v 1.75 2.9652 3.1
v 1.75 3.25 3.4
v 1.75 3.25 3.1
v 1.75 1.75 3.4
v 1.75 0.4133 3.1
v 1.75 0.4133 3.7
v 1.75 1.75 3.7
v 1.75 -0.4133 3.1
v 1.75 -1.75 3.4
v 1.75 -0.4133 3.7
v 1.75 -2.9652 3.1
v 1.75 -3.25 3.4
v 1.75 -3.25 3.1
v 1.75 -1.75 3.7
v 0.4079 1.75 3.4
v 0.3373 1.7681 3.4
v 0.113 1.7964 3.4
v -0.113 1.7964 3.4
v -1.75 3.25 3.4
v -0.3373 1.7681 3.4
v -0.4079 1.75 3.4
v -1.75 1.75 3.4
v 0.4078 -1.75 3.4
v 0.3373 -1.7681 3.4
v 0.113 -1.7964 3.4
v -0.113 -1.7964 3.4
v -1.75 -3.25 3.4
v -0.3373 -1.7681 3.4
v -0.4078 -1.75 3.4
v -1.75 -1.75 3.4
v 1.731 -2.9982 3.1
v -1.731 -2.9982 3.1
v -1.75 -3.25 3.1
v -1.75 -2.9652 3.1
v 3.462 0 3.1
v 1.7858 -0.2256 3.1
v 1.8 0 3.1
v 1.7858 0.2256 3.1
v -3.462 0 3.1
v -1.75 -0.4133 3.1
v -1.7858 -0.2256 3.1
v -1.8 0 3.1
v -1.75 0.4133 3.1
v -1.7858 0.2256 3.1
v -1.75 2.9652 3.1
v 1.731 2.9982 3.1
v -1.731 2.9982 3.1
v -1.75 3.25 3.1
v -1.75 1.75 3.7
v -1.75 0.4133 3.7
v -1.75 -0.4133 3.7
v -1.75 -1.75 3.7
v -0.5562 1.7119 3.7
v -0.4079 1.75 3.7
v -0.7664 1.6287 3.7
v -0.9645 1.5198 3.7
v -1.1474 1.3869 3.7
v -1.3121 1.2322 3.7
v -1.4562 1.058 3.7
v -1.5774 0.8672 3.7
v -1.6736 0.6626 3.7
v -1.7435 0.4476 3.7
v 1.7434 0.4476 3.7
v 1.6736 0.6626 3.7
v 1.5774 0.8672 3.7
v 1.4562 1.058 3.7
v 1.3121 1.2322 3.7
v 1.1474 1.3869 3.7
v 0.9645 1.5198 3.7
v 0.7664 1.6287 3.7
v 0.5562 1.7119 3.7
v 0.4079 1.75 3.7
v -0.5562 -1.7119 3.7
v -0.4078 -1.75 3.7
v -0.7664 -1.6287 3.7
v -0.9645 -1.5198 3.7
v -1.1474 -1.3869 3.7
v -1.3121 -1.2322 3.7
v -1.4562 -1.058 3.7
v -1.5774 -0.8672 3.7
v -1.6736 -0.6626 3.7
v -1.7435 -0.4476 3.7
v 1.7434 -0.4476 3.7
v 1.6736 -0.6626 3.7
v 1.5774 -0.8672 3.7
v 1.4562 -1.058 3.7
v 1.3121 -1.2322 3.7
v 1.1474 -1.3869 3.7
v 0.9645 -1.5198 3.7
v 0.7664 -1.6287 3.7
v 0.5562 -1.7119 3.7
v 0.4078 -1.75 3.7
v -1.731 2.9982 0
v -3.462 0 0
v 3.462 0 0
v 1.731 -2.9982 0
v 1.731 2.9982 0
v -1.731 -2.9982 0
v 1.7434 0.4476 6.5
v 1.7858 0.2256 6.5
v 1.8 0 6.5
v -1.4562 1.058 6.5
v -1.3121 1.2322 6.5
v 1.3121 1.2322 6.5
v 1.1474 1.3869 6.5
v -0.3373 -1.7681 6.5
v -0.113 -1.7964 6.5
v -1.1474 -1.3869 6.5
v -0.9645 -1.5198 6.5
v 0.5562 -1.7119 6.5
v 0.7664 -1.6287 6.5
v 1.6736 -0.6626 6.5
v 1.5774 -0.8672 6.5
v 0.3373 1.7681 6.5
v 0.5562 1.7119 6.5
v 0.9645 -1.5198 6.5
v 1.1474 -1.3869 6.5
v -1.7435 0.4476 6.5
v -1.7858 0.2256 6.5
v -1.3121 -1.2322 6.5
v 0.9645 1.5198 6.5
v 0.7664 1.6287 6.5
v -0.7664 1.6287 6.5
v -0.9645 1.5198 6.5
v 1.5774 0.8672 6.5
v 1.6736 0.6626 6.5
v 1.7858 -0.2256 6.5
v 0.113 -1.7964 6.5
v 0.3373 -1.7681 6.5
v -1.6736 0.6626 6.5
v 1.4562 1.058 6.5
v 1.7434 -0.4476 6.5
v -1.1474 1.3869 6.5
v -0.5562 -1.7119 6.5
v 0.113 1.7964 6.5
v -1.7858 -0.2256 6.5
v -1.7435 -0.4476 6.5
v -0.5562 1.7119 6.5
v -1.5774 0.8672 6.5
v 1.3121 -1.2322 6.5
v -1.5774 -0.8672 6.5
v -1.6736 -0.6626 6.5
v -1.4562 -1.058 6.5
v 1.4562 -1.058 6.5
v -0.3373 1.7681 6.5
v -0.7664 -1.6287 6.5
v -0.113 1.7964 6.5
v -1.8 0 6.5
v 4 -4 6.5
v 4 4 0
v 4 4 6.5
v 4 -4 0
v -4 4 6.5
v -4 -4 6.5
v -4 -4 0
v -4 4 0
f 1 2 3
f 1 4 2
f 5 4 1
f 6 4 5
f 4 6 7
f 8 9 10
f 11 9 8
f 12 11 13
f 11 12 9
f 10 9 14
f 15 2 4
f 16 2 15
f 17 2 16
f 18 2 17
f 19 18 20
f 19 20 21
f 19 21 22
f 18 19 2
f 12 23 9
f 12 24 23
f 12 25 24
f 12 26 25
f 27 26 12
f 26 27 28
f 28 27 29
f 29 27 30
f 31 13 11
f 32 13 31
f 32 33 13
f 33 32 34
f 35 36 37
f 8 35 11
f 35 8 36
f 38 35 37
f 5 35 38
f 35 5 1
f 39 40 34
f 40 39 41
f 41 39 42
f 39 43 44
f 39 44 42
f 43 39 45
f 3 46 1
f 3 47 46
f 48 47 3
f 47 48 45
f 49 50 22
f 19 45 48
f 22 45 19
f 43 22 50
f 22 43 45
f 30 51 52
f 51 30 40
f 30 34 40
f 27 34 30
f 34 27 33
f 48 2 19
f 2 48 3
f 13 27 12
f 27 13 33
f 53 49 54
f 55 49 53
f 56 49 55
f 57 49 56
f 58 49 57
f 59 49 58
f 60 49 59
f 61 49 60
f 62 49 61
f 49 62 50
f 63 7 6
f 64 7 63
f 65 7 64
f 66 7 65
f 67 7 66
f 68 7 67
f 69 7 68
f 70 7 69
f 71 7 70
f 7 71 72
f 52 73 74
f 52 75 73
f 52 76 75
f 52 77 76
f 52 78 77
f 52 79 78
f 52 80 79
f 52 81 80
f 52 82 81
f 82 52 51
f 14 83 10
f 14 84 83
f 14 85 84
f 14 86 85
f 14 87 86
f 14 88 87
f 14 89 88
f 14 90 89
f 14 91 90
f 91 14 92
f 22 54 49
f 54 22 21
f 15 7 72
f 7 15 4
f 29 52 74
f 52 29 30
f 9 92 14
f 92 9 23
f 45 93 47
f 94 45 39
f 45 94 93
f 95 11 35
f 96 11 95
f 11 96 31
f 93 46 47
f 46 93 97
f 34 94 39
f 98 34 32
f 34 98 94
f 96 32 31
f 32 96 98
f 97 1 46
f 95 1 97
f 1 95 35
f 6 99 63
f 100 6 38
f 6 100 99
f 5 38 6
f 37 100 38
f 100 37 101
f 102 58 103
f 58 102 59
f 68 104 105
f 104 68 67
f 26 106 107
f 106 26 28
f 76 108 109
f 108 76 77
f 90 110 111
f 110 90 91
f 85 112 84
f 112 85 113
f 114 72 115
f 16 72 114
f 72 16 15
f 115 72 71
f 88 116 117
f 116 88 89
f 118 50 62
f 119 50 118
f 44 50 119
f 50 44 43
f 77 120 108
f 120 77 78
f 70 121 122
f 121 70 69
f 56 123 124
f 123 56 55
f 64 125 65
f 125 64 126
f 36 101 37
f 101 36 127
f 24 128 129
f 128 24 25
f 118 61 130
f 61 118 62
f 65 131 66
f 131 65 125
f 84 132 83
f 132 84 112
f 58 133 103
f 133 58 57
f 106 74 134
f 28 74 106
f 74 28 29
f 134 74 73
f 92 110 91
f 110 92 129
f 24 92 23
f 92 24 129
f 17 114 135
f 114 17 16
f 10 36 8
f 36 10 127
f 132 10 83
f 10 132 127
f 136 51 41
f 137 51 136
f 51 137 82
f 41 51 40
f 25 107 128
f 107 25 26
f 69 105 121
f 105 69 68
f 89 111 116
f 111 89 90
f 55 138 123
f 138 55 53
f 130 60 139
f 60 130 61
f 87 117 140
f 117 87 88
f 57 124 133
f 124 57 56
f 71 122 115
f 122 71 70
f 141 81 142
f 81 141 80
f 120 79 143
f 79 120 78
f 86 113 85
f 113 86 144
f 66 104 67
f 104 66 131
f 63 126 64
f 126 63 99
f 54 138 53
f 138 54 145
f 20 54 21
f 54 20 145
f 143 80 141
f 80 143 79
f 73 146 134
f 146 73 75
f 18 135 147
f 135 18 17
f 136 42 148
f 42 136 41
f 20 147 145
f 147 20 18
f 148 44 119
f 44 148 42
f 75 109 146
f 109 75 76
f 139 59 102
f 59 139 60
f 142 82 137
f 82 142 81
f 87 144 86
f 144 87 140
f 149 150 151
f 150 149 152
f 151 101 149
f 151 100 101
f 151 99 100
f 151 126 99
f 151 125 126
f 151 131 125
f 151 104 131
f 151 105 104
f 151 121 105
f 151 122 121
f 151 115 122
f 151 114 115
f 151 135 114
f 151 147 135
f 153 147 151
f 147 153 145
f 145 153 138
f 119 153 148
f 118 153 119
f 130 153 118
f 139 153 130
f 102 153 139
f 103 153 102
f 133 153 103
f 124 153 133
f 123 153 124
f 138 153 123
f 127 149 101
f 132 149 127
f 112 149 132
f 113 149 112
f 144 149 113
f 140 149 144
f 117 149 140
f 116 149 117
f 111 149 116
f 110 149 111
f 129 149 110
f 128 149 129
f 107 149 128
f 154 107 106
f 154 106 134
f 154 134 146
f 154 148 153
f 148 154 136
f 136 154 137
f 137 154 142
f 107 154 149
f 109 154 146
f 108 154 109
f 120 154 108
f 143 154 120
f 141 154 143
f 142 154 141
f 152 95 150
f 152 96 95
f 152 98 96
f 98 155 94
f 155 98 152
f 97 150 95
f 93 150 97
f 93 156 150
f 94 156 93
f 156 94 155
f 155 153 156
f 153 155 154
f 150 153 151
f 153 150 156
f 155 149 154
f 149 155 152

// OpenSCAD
$fn = 50;

difference() {
	union() {
		translate(v = [-22.5, 7.5, 9.5]) {
			rotate(a = [0, 0, 0]) {
				difference() {
					union() {
						translate(v = [18.5, -11.5, -9.5]) {
							cube(size = [8, 8, 6.5]);
						}
					}
					union() {
						translate(v = [22.5, -7.5, -9.6]) {
							rotate(a = [0, 0, 0]) {
								difference() {
									union() {
										translate(v = [-1.75, -3.25, -0.3]) {
											cube(size = [3.5, 6.5, 0.3]);
										}
										translate(v = [-1.75, -1.75, -0.6]) {
											cube(size = [3.5, 3.5, 0.3]);
										}
										translate(v = [-1.75, -3.25, 3.2]) {
											cube(size = [3.5, 6.5, 0.3]);
										}
										translate(v = [-1.75, -1.75, 3.5]) {
											cube(size = [3.5, 3.5, 0.3]);
										}
										linear_extrude(height = 3.2) {
											polygon(points = [[3.4619999999999997, 0.0], [1.7310000000000003, 2.9981799479017264], [-1.7309999999999992, 2.9981799479017264], [-3.4619999999999997, 4.2397272186481365e-16], [-1.7310000000000014, -2.998179947901726], [1.7309999999999977, -2.9981799479017277]]);
										}
										translate(v = [-1.75, -3.25, -0.3]) {
											cube(size = [3.5, 6.5, 0.3]);
										}
										translate(v = [-1.75, -1.75, -0.6]) {
											cube(size = [3.5, 3.5, 0.3]);
										}
										translate(v = [-1.75, -3.25, 3.2]) {
											cube(size = [3.5, 6.5, 0.3]);
										}
										translate(v = [-1.75, -1.75, 3.5]) {
											cube(size = [3.5, 3.5, 0.3]);
										}
										translate(v = [-1.75, -3.25, -0.3]) {
											cube(size = [3.5, 6.5, 0.3]);
										}
										translate(v = [-1.75, -1.75, -0.6]) {
											cube(size = [3.5, 3.5, 0.3]);
										}
										translate(v = [-1.75, -3.25, 3.2]) {
											cube(size = [3.5, 6.5, 0.3]);
										}
										translate(v = [-1.75, -1.75, 3.5]) {
											cube(size = [3.5, 3.5, 0.3]);
										}
									}
									union();
								}
							}
						}
						translate(v = [22.5, -7.5, -9.6]) {
							cylinder(h = 6.7, r = 1.8);
						}
					}
				}
			}
		}
	}
	union();
}
